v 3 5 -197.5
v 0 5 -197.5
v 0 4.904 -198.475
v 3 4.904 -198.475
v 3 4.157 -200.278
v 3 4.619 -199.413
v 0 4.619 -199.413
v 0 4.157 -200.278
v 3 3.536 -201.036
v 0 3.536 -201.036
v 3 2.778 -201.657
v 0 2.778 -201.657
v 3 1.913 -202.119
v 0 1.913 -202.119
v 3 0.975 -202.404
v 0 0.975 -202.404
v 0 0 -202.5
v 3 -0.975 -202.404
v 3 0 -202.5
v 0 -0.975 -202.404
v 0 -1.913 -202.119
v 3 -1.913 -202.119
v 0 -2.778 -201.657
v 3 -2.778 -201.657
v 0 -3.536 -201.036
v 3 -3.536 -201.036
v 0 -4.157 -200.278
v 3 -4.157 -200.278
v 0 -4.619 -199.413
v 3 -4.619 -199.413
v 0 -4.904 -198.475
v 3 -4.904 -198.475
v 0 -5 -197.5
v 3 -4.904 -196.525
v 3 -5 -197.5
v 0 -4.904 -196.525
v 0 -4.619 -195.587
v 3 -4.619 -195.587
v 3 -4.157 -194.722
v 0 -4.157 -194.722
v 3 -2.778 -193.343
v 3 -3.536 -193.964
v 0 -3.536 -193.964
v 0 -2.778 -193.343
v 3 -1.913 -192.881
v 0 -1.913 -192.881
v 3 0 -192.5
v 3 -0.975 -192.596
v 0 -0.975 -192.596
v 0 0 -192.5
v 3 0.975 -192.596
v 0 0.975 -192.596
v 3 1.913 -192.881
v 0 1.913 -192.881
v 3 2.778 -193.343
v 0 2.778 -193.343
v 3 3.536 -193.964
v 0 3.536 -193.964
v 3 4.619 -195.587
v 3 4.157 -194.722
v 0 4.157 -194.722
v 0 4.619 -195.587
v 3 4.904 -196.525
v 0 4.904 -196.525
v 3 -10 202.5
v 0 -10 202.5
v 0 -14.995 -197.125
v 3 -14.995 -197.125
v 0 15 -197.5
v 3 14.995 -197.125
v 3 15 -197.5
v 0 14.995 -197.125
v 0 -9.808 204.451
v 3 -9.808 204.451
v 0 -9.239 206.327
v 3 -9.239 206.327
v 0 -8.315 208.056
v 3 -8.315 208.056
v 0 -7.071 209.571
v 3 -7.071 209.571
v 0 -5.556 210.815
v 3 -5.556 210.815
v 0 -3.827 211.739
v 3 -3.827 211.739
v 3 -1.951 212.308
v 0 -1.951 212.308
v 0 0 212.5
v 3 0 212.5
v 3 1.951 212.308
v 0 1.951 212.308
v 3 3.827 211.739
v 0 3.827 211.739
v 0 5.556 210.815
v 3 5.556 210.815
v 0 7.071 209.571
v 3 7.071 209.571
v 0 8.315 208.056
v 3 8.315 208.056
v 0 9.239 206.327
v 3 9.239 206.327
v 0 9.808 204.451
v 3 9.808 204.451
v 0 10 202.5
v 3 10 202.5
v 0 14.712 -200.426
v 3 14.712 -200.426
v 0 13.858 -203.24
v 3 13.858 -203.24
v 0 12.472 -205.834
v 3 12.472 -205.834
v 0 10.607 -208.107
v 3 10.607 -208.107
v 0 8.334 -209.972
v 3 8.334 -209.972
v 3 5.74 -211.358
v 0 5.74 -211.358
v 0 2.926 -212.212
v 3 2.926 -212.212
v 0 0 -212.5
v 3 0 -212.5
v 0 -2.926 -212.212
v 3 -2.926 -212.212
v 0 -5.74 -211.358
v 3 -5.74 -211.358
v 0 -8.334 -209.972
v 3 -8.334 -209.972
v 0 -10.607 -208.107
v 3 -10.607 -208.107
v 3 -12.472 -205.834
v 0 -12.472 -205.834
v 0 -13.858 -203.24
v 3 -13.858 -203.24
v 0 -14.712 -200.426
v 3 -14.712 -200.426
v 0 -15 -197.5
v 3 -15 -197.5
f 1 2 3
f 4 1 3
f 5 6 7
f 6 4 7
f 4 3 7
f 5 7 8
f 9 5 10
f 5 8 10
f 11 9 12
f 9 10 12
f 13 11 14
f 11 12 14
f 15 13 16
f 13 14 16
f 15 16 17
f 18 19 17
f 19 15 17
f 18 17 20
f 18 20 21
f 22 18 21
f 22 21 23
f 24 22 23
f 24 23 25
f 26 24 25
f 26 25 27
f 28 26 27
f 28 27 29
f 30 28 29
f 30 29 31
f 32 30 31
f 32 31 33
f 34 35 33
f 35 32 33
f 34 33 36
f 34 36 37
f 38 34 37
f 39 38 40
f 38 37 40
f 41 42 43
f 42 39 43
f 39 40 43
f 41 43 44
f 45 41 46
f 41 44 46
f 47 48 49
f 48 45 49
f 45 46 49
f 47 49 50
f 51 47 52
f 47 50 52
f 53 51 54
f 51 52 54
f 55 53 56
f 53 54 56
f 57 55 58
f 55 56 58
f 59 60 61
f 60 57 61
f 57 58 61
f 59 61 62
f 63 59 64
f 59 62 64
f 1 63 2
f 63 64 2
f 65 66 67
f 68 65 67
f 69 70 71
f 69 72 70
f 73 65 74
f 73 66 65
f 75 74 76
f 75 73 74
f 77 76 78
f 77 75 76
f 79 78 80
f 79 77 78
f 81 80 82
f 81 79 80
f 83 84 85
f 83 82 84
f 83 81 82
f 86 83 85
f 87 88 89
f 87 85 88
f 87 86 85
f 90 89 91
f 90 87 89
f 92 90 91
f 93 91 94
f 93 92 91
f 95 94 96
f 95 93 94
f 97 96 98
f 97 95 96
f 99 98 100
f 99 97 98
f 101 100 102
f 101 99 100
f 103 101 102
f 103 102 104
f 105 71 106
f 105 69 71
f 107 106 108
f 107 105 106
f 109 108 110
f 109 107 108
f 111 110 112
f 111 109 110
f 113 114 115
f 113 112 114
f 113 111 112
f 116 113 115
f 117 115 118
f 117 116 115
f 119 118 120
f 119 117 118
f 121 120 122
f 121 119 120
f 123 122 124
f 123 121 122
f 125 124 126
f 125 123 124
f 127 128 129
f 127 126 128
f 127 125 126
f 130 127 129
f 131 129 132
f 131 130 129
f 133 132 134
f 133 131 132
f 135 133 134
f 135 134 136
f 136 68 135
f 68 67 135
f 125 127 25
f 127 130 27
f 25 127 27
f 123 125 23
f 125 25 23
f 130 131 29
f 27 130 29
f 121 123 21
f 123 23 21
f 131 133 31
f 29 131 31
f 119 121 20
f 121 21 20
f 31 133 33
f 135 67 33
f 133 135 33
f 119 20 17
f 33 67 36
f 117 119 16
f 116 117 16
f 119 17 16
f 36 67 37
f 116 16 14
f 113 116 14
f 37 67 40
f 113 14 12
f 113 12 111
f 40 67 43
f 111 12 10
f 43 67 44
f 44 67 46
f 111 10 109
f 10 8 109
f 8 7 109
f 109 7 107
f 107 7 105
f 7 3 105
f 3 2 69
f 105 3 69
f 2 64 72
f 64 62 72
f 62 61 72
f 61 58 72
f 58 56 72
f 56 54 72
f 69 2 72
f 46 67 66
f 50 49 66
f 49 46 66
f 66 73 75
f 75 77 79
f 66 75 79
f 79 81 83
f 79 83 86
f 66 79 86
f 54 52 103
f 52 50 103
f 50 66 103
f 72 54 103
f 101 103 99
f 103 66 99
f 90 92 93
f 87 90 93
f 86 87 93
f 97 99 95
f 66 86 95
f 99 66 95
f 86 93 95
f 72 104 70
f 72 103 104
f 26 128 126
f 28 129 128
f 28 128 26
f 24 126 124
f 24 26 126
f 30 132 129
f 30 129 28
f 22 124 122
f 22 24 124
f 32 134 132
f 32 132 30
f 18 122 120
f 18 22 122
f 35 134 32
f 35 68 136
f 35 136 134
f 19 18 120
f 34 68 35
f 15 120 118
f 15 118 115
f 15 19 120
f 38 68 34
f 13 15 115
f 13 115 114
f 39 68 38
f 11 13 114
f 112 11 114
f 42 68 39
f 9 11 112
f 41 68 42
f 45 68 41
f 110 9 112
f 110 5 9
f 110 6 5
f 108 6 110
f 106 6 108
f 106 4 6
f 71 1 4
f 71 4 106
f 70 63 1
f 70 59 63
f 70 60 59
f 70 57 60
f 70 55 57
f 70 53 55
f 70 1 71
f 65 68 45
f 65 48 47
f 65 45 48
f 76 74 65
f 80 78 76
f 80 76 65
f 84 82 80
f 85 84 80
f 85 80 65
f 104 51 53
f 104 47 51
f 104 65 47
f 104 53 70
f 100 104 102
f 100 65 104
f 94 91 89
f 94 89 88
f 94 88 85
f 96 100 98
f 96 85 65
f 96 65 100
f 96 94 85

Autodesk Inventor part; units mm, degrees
ref_plane "YZ Plane" through (0, 0, 0) normal (1, 0, 0) x (0, 1, 0)
ref_plane "XZ Plane" through (0, 0, 0) normal (0, 1, 0) x (-1, 0, 0)
ref_plane "XY Plane" through (0, 0, 0) normal (0, 0, 1) x (1, 0, 0)
sketch "Boceto1" plane through (0, 0, -197.5) normal (1, 0, 0) x (0, 1, 0)
  arc A0 (10, 400) -> (-10, 400) centre (0, 400) ccw
  line L0 (-10, 400) -> (-15, 0)
  line L1 (10, 400) -> (15, 0)
  arc A1 (-14.9953, 0.3749) -> (14.9953, 0.3749) centre (0, 0) ccw
  circle A2 centre (0, 0) radius 5
  dimension "d1" = 20
  dimension "d0" = 10
extrude "Extrusión1" add sketch "Boceto1" along normal blind 3
properties part number "BrazoPalanca"
